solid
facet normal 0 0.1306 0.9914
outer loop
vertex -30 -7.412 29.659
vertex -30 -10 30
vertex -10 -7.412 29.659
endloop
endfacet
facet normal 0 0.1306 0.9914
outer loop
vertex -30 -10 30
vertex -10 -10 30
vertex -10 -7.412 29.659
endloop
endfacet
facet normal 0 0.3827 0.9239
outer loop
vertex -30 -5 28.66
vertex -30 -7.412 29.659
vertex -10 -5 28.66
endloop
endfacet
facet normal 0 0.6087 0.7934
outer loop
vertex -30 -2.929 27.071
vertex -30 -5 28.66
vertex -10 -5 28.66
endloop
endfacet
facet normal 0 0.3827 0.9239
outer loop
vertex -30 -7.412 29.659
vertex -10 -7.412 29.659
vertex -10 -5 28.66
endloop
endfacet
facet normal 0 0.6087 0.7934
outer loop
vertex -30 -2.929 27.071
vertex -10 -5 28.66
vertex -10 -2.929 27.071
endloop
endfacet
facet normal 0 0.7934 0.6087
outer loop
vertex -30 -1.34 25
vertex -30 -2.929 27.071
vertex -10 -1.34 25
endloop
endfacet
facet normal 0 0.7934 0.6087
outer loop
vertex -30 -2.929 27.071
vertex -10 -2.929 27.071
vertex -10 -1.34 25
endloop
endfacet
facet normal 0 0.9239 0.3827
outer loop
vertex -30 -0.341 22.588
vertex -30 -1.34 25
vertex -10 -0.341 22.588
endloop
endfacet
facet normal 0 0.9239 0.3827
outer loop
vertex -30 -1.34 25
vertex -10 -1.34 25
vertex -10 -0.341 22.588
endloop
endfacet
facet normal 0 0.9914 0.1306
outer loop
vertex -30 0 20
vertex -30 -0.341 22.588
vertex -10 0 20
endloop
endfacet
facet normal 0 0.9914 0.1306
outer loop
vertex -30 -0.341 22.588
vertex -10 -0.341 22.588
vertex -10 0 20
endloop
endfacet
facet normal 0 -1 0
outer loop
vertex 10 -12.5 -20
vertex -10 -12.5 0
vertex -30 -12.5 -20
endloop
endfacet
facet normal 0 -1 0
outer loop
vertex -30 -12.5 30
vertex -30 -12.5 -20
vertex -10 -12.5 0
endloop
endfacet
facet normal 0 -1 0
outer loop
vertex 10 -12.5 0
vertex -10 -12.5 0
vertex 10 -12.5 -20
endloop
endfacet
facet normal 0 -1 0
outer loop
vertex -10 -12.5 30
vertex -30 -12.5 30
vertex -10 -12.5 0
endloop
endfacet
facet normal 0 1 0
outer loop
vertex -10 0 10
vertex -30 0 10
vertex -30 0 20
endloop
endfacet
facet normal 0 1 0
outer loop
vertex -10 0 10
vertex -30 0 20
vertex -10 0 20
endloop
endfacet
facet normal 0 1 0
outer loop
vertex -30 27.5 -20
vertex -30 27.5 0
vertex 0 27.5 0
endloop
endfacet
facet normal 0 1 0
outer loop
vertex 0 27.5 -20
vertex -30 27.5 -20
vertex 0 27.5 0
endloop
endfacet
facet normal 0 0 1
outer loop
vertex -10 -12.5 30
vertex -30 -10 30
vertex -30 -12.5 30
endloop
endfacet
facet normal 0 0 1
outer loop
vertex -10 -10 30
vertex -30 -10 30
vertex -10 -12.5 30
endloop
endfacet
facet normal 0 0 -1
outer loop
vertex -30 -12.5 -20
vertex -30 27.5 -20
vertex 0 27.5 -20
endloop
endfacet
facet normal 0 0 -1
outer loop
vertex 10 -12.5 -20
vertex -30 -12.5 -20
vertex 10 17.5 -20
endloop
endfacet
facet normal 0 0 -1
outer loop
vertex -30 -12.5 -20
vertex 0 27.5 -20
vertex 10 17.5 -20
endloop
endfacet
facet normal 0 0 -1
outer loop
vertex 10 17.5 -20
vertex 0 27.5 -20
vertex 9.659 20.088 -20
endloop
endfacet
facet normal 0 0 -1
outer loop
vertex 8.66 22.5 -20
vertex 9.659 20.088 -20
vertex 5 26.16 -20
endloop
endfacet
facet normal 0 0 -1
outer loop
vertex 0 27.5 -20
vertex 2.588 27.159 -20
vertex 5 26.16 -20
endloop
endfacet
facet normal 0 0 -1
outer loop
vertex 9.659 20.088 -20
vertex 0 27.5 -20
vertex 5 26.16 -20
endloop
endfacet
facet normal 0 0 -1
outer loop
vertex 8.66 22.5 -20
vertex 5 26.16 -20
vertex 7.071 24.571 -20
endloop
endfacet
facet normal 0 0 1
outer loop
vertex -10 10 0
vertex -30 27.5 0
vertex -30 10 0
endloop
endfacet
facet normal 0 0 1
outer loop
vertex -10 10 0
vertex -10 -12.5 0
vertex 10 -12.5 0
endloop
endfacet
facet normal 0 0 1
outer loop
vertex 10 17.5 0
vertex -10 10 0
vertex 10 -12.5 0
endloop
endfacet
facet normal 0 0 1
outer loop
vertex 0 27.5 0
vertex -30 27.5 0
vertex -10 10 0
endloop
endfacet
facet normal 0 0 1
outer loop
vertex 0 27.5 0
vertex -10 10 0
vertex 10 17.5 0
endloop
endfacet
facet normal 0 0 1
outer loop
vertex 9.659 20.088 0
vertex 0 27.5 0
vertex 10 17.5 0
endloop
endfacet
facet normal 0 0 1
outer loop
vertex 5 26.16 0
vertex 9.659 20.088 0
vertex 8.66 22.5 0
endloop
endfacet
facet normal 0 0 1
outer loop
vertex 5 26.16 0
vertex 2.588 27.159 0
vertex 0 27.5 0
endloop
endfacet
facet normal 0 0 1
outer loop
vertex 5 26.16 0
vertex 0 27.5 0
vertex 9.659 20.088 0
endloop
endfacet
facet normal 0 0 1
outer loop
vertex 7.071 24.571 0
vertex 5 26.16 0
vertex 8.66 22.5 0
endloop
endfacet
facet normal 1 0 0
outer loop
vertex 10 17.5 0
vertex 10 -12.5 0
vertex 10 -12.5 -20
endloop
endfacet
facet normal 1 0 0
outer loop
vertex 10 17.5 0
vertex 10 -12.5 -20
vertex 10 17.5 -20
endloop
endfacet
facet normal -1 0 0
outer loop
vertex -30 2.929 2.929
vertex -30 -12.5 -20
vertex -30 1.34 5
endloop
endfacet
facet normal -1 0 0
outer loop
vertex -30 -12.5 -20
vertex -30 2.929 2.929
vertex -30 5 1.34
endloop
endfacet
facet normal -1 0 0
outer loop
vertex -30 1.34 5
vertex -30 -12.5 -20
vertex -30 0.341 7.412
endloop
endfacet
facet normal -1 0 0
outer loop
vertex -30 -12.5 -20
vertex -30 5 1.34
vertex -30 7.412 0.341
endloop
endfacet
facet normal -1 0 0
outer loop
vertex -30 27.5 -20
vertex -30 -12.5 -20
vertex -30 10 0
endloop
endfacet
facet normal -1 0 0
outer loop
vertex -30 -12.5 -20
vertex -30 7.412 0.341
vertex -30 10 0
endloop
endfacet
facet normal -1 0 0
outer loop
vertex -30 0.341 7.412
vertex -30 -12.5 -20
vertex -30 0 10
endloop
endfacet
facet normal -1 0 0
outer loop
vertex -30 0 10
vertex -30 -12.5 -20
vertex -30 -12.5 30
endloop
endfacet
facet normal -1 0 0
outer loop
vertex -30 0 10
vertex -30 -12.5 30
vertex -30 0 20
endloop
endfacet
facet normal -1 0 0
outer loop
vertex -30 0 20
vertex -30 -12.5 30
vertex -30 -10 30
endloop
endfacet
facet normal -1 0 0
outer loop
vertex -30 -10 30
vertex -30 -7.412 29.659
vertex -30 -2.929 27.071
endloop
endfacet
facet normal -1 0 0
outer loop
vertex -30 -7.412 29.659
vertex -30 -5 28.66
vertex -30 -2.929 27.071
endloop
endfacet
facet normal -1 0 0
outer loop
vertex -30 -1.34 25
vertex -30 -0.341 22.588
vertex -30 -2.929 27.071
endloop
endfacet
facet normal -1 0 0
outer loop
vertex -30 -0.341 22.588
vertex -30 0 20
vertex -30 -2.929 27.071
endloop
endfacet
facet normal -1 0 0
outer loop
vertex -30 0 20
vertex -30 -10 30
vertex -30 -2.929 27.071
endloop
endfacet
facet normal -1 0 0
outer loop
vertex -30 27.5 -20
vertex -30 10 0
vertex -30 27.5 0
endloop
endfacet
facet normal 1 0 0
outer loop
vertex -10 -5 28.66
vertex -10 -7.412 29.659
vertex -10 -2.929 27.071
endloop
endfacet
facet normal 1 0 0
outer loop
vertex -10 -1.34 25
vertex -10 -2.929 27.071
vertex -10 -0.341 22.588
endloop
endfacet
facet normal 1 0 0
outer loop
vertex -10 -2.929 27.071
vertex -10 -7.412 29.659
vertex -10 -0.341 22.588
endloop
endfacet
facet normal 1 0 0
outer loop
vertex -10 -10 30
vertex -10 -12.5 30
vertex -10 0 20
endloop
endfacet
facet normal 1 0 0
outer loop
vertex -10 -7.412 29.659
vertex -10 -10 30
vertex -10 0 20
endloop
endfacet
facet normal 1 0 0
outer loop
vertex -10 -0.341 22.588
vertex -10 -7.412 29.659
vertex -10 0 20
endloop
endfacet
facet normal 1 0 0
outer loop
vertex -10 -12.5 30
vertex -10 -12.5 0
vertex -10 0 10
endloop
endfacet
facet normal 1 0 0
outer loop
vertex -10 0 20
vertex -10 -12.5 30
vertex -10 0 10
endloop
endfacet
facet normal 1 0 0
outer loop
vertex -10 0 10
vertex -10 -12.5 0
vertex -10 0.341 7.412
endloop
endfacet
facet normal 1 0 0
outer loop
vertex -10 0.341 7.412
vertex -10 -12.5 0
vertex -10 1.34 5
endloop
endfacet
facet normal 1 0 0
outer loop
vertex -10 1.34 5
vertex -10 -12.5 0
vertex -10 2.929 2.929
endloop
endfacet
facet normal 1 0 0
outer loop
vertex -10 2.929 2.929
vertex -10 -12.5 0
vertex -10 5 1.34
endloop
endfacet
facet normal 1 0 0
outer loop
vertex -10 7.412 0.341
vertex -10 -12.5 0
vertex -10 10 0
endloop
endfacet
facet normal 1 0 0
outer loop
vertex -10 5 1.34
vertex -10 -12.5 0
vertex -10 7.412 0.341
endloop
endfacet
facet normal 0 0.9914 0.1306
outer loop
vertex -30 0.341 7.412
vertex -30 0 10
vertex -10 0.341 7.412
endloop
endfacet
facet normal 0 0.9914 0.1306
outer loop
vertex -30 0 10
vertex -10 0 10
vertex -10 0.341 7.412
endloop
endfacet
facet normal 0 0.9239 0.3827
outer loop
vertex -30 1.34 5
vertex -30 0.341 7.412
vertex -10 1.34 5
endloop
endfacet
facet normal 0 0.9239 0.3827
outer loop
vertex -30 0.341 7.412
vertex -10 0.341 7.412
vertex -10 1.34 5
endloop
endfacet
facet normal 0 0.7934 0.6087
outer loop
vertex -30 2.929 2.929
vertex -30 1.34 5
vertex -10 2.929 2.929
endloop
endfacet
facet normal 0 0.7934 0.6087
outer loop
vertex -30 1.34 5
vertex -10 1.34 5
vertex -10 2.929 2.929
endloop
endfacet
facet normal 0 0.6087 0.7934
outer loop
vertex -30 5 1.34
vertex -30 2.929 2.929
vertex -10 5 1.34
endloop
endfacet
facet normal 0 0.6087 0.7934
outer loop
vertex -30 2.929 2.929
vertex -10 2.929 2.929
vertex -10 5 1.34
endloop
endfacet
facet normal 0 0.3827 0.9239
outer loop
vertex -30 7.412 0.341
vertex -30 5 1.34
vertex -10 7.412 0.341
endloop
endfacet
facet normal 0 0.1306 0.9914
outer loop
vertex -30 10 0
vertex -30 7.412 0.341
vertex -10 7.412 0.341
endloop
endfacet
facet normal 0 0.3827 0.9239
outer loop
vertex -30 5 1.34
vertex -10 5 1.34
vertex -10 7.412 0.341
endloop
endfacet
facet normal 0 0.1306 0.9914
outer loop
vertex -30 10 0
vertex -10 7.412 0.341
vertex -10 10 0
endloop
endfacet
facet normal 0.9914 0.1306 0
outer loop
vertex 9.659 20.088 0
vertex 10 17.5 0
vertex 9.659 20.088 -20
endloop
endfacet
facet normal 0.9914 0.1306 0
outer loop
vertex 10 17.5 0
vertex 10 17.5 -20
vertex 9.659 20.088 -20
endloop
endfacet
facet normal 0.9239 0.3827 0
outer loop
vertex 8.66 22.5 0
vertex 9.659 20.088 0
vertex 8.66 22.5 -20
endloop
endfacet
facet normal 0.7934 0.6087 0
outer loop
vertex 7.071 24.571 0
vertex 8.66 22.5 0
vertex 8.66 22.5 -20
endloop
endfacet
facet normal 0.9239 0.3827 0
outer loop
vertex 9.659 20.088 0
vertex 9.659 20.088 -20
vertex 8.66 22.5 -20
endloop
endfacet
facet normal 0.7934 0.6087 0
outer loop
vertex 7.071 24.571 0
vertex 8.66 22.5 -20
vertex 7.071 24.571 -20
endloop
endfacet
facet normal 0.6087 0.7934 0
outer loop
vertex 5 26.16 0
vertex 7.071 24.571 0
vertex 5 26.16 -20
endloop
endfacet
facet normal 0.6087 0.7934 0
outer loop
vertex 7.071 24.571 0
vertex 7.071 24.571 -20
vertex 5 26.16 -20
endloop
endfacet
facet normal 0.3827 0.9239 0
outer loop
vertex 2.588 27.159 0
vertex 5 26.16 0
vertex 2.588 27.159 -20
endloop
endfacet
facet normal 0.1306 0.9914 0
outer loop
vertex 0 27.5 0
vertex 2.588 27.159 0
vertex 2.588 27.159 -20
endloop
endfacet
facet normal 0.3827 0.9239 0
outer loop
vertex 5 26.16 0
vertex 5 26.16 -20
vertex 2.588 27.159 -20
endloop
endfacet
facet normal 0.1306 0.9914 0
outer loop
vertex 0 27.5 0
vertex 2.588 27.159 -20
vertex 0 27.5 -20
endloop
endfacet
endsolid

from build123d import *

# Parameters (mm, degrees)
SKETCH1_W           = 20
SKETCH1_H           = 12.5
BOSS_EXTRUDE1_DEPTH = 30
SKETCH2_W           = 40
SKETCH2_H           = 40
BOSS_EXTRUDE2_DEPTH = 20
FILLET1_R           = 10


with BuildPart() as part:
    # Sketch1 → Boss-Extrude1 (new body)
    with BuildSketch(Plane.XY):
        with Locations((-20, -6.25)):
            Rectangle(SKETCH1_W, SKETCH1_H)
    extrude(amount=BOSS_EXTRUDE1_DEPTH)

    # Sketch2 → Boss-Extrude2 (add)
    with BuildSketch(Plane.XY):
        with Locations((-10, 7.5)):
            Rectangle(SKETCH2_W, SKETCH2_H)
    extrude(amount=-BOSS_EXTRUDE2_DEPTH)

    # Fillet1
    fillet1_edges = [part.edges().sort_by_distance(p)[0] for p in [
        (10, 27.5, -10),
        (-20, 0, 30),
        (-20, 0, 0),
    ]]
    fillet(fillet1_edges, radius=FILLET1_R)


solid = part.part
